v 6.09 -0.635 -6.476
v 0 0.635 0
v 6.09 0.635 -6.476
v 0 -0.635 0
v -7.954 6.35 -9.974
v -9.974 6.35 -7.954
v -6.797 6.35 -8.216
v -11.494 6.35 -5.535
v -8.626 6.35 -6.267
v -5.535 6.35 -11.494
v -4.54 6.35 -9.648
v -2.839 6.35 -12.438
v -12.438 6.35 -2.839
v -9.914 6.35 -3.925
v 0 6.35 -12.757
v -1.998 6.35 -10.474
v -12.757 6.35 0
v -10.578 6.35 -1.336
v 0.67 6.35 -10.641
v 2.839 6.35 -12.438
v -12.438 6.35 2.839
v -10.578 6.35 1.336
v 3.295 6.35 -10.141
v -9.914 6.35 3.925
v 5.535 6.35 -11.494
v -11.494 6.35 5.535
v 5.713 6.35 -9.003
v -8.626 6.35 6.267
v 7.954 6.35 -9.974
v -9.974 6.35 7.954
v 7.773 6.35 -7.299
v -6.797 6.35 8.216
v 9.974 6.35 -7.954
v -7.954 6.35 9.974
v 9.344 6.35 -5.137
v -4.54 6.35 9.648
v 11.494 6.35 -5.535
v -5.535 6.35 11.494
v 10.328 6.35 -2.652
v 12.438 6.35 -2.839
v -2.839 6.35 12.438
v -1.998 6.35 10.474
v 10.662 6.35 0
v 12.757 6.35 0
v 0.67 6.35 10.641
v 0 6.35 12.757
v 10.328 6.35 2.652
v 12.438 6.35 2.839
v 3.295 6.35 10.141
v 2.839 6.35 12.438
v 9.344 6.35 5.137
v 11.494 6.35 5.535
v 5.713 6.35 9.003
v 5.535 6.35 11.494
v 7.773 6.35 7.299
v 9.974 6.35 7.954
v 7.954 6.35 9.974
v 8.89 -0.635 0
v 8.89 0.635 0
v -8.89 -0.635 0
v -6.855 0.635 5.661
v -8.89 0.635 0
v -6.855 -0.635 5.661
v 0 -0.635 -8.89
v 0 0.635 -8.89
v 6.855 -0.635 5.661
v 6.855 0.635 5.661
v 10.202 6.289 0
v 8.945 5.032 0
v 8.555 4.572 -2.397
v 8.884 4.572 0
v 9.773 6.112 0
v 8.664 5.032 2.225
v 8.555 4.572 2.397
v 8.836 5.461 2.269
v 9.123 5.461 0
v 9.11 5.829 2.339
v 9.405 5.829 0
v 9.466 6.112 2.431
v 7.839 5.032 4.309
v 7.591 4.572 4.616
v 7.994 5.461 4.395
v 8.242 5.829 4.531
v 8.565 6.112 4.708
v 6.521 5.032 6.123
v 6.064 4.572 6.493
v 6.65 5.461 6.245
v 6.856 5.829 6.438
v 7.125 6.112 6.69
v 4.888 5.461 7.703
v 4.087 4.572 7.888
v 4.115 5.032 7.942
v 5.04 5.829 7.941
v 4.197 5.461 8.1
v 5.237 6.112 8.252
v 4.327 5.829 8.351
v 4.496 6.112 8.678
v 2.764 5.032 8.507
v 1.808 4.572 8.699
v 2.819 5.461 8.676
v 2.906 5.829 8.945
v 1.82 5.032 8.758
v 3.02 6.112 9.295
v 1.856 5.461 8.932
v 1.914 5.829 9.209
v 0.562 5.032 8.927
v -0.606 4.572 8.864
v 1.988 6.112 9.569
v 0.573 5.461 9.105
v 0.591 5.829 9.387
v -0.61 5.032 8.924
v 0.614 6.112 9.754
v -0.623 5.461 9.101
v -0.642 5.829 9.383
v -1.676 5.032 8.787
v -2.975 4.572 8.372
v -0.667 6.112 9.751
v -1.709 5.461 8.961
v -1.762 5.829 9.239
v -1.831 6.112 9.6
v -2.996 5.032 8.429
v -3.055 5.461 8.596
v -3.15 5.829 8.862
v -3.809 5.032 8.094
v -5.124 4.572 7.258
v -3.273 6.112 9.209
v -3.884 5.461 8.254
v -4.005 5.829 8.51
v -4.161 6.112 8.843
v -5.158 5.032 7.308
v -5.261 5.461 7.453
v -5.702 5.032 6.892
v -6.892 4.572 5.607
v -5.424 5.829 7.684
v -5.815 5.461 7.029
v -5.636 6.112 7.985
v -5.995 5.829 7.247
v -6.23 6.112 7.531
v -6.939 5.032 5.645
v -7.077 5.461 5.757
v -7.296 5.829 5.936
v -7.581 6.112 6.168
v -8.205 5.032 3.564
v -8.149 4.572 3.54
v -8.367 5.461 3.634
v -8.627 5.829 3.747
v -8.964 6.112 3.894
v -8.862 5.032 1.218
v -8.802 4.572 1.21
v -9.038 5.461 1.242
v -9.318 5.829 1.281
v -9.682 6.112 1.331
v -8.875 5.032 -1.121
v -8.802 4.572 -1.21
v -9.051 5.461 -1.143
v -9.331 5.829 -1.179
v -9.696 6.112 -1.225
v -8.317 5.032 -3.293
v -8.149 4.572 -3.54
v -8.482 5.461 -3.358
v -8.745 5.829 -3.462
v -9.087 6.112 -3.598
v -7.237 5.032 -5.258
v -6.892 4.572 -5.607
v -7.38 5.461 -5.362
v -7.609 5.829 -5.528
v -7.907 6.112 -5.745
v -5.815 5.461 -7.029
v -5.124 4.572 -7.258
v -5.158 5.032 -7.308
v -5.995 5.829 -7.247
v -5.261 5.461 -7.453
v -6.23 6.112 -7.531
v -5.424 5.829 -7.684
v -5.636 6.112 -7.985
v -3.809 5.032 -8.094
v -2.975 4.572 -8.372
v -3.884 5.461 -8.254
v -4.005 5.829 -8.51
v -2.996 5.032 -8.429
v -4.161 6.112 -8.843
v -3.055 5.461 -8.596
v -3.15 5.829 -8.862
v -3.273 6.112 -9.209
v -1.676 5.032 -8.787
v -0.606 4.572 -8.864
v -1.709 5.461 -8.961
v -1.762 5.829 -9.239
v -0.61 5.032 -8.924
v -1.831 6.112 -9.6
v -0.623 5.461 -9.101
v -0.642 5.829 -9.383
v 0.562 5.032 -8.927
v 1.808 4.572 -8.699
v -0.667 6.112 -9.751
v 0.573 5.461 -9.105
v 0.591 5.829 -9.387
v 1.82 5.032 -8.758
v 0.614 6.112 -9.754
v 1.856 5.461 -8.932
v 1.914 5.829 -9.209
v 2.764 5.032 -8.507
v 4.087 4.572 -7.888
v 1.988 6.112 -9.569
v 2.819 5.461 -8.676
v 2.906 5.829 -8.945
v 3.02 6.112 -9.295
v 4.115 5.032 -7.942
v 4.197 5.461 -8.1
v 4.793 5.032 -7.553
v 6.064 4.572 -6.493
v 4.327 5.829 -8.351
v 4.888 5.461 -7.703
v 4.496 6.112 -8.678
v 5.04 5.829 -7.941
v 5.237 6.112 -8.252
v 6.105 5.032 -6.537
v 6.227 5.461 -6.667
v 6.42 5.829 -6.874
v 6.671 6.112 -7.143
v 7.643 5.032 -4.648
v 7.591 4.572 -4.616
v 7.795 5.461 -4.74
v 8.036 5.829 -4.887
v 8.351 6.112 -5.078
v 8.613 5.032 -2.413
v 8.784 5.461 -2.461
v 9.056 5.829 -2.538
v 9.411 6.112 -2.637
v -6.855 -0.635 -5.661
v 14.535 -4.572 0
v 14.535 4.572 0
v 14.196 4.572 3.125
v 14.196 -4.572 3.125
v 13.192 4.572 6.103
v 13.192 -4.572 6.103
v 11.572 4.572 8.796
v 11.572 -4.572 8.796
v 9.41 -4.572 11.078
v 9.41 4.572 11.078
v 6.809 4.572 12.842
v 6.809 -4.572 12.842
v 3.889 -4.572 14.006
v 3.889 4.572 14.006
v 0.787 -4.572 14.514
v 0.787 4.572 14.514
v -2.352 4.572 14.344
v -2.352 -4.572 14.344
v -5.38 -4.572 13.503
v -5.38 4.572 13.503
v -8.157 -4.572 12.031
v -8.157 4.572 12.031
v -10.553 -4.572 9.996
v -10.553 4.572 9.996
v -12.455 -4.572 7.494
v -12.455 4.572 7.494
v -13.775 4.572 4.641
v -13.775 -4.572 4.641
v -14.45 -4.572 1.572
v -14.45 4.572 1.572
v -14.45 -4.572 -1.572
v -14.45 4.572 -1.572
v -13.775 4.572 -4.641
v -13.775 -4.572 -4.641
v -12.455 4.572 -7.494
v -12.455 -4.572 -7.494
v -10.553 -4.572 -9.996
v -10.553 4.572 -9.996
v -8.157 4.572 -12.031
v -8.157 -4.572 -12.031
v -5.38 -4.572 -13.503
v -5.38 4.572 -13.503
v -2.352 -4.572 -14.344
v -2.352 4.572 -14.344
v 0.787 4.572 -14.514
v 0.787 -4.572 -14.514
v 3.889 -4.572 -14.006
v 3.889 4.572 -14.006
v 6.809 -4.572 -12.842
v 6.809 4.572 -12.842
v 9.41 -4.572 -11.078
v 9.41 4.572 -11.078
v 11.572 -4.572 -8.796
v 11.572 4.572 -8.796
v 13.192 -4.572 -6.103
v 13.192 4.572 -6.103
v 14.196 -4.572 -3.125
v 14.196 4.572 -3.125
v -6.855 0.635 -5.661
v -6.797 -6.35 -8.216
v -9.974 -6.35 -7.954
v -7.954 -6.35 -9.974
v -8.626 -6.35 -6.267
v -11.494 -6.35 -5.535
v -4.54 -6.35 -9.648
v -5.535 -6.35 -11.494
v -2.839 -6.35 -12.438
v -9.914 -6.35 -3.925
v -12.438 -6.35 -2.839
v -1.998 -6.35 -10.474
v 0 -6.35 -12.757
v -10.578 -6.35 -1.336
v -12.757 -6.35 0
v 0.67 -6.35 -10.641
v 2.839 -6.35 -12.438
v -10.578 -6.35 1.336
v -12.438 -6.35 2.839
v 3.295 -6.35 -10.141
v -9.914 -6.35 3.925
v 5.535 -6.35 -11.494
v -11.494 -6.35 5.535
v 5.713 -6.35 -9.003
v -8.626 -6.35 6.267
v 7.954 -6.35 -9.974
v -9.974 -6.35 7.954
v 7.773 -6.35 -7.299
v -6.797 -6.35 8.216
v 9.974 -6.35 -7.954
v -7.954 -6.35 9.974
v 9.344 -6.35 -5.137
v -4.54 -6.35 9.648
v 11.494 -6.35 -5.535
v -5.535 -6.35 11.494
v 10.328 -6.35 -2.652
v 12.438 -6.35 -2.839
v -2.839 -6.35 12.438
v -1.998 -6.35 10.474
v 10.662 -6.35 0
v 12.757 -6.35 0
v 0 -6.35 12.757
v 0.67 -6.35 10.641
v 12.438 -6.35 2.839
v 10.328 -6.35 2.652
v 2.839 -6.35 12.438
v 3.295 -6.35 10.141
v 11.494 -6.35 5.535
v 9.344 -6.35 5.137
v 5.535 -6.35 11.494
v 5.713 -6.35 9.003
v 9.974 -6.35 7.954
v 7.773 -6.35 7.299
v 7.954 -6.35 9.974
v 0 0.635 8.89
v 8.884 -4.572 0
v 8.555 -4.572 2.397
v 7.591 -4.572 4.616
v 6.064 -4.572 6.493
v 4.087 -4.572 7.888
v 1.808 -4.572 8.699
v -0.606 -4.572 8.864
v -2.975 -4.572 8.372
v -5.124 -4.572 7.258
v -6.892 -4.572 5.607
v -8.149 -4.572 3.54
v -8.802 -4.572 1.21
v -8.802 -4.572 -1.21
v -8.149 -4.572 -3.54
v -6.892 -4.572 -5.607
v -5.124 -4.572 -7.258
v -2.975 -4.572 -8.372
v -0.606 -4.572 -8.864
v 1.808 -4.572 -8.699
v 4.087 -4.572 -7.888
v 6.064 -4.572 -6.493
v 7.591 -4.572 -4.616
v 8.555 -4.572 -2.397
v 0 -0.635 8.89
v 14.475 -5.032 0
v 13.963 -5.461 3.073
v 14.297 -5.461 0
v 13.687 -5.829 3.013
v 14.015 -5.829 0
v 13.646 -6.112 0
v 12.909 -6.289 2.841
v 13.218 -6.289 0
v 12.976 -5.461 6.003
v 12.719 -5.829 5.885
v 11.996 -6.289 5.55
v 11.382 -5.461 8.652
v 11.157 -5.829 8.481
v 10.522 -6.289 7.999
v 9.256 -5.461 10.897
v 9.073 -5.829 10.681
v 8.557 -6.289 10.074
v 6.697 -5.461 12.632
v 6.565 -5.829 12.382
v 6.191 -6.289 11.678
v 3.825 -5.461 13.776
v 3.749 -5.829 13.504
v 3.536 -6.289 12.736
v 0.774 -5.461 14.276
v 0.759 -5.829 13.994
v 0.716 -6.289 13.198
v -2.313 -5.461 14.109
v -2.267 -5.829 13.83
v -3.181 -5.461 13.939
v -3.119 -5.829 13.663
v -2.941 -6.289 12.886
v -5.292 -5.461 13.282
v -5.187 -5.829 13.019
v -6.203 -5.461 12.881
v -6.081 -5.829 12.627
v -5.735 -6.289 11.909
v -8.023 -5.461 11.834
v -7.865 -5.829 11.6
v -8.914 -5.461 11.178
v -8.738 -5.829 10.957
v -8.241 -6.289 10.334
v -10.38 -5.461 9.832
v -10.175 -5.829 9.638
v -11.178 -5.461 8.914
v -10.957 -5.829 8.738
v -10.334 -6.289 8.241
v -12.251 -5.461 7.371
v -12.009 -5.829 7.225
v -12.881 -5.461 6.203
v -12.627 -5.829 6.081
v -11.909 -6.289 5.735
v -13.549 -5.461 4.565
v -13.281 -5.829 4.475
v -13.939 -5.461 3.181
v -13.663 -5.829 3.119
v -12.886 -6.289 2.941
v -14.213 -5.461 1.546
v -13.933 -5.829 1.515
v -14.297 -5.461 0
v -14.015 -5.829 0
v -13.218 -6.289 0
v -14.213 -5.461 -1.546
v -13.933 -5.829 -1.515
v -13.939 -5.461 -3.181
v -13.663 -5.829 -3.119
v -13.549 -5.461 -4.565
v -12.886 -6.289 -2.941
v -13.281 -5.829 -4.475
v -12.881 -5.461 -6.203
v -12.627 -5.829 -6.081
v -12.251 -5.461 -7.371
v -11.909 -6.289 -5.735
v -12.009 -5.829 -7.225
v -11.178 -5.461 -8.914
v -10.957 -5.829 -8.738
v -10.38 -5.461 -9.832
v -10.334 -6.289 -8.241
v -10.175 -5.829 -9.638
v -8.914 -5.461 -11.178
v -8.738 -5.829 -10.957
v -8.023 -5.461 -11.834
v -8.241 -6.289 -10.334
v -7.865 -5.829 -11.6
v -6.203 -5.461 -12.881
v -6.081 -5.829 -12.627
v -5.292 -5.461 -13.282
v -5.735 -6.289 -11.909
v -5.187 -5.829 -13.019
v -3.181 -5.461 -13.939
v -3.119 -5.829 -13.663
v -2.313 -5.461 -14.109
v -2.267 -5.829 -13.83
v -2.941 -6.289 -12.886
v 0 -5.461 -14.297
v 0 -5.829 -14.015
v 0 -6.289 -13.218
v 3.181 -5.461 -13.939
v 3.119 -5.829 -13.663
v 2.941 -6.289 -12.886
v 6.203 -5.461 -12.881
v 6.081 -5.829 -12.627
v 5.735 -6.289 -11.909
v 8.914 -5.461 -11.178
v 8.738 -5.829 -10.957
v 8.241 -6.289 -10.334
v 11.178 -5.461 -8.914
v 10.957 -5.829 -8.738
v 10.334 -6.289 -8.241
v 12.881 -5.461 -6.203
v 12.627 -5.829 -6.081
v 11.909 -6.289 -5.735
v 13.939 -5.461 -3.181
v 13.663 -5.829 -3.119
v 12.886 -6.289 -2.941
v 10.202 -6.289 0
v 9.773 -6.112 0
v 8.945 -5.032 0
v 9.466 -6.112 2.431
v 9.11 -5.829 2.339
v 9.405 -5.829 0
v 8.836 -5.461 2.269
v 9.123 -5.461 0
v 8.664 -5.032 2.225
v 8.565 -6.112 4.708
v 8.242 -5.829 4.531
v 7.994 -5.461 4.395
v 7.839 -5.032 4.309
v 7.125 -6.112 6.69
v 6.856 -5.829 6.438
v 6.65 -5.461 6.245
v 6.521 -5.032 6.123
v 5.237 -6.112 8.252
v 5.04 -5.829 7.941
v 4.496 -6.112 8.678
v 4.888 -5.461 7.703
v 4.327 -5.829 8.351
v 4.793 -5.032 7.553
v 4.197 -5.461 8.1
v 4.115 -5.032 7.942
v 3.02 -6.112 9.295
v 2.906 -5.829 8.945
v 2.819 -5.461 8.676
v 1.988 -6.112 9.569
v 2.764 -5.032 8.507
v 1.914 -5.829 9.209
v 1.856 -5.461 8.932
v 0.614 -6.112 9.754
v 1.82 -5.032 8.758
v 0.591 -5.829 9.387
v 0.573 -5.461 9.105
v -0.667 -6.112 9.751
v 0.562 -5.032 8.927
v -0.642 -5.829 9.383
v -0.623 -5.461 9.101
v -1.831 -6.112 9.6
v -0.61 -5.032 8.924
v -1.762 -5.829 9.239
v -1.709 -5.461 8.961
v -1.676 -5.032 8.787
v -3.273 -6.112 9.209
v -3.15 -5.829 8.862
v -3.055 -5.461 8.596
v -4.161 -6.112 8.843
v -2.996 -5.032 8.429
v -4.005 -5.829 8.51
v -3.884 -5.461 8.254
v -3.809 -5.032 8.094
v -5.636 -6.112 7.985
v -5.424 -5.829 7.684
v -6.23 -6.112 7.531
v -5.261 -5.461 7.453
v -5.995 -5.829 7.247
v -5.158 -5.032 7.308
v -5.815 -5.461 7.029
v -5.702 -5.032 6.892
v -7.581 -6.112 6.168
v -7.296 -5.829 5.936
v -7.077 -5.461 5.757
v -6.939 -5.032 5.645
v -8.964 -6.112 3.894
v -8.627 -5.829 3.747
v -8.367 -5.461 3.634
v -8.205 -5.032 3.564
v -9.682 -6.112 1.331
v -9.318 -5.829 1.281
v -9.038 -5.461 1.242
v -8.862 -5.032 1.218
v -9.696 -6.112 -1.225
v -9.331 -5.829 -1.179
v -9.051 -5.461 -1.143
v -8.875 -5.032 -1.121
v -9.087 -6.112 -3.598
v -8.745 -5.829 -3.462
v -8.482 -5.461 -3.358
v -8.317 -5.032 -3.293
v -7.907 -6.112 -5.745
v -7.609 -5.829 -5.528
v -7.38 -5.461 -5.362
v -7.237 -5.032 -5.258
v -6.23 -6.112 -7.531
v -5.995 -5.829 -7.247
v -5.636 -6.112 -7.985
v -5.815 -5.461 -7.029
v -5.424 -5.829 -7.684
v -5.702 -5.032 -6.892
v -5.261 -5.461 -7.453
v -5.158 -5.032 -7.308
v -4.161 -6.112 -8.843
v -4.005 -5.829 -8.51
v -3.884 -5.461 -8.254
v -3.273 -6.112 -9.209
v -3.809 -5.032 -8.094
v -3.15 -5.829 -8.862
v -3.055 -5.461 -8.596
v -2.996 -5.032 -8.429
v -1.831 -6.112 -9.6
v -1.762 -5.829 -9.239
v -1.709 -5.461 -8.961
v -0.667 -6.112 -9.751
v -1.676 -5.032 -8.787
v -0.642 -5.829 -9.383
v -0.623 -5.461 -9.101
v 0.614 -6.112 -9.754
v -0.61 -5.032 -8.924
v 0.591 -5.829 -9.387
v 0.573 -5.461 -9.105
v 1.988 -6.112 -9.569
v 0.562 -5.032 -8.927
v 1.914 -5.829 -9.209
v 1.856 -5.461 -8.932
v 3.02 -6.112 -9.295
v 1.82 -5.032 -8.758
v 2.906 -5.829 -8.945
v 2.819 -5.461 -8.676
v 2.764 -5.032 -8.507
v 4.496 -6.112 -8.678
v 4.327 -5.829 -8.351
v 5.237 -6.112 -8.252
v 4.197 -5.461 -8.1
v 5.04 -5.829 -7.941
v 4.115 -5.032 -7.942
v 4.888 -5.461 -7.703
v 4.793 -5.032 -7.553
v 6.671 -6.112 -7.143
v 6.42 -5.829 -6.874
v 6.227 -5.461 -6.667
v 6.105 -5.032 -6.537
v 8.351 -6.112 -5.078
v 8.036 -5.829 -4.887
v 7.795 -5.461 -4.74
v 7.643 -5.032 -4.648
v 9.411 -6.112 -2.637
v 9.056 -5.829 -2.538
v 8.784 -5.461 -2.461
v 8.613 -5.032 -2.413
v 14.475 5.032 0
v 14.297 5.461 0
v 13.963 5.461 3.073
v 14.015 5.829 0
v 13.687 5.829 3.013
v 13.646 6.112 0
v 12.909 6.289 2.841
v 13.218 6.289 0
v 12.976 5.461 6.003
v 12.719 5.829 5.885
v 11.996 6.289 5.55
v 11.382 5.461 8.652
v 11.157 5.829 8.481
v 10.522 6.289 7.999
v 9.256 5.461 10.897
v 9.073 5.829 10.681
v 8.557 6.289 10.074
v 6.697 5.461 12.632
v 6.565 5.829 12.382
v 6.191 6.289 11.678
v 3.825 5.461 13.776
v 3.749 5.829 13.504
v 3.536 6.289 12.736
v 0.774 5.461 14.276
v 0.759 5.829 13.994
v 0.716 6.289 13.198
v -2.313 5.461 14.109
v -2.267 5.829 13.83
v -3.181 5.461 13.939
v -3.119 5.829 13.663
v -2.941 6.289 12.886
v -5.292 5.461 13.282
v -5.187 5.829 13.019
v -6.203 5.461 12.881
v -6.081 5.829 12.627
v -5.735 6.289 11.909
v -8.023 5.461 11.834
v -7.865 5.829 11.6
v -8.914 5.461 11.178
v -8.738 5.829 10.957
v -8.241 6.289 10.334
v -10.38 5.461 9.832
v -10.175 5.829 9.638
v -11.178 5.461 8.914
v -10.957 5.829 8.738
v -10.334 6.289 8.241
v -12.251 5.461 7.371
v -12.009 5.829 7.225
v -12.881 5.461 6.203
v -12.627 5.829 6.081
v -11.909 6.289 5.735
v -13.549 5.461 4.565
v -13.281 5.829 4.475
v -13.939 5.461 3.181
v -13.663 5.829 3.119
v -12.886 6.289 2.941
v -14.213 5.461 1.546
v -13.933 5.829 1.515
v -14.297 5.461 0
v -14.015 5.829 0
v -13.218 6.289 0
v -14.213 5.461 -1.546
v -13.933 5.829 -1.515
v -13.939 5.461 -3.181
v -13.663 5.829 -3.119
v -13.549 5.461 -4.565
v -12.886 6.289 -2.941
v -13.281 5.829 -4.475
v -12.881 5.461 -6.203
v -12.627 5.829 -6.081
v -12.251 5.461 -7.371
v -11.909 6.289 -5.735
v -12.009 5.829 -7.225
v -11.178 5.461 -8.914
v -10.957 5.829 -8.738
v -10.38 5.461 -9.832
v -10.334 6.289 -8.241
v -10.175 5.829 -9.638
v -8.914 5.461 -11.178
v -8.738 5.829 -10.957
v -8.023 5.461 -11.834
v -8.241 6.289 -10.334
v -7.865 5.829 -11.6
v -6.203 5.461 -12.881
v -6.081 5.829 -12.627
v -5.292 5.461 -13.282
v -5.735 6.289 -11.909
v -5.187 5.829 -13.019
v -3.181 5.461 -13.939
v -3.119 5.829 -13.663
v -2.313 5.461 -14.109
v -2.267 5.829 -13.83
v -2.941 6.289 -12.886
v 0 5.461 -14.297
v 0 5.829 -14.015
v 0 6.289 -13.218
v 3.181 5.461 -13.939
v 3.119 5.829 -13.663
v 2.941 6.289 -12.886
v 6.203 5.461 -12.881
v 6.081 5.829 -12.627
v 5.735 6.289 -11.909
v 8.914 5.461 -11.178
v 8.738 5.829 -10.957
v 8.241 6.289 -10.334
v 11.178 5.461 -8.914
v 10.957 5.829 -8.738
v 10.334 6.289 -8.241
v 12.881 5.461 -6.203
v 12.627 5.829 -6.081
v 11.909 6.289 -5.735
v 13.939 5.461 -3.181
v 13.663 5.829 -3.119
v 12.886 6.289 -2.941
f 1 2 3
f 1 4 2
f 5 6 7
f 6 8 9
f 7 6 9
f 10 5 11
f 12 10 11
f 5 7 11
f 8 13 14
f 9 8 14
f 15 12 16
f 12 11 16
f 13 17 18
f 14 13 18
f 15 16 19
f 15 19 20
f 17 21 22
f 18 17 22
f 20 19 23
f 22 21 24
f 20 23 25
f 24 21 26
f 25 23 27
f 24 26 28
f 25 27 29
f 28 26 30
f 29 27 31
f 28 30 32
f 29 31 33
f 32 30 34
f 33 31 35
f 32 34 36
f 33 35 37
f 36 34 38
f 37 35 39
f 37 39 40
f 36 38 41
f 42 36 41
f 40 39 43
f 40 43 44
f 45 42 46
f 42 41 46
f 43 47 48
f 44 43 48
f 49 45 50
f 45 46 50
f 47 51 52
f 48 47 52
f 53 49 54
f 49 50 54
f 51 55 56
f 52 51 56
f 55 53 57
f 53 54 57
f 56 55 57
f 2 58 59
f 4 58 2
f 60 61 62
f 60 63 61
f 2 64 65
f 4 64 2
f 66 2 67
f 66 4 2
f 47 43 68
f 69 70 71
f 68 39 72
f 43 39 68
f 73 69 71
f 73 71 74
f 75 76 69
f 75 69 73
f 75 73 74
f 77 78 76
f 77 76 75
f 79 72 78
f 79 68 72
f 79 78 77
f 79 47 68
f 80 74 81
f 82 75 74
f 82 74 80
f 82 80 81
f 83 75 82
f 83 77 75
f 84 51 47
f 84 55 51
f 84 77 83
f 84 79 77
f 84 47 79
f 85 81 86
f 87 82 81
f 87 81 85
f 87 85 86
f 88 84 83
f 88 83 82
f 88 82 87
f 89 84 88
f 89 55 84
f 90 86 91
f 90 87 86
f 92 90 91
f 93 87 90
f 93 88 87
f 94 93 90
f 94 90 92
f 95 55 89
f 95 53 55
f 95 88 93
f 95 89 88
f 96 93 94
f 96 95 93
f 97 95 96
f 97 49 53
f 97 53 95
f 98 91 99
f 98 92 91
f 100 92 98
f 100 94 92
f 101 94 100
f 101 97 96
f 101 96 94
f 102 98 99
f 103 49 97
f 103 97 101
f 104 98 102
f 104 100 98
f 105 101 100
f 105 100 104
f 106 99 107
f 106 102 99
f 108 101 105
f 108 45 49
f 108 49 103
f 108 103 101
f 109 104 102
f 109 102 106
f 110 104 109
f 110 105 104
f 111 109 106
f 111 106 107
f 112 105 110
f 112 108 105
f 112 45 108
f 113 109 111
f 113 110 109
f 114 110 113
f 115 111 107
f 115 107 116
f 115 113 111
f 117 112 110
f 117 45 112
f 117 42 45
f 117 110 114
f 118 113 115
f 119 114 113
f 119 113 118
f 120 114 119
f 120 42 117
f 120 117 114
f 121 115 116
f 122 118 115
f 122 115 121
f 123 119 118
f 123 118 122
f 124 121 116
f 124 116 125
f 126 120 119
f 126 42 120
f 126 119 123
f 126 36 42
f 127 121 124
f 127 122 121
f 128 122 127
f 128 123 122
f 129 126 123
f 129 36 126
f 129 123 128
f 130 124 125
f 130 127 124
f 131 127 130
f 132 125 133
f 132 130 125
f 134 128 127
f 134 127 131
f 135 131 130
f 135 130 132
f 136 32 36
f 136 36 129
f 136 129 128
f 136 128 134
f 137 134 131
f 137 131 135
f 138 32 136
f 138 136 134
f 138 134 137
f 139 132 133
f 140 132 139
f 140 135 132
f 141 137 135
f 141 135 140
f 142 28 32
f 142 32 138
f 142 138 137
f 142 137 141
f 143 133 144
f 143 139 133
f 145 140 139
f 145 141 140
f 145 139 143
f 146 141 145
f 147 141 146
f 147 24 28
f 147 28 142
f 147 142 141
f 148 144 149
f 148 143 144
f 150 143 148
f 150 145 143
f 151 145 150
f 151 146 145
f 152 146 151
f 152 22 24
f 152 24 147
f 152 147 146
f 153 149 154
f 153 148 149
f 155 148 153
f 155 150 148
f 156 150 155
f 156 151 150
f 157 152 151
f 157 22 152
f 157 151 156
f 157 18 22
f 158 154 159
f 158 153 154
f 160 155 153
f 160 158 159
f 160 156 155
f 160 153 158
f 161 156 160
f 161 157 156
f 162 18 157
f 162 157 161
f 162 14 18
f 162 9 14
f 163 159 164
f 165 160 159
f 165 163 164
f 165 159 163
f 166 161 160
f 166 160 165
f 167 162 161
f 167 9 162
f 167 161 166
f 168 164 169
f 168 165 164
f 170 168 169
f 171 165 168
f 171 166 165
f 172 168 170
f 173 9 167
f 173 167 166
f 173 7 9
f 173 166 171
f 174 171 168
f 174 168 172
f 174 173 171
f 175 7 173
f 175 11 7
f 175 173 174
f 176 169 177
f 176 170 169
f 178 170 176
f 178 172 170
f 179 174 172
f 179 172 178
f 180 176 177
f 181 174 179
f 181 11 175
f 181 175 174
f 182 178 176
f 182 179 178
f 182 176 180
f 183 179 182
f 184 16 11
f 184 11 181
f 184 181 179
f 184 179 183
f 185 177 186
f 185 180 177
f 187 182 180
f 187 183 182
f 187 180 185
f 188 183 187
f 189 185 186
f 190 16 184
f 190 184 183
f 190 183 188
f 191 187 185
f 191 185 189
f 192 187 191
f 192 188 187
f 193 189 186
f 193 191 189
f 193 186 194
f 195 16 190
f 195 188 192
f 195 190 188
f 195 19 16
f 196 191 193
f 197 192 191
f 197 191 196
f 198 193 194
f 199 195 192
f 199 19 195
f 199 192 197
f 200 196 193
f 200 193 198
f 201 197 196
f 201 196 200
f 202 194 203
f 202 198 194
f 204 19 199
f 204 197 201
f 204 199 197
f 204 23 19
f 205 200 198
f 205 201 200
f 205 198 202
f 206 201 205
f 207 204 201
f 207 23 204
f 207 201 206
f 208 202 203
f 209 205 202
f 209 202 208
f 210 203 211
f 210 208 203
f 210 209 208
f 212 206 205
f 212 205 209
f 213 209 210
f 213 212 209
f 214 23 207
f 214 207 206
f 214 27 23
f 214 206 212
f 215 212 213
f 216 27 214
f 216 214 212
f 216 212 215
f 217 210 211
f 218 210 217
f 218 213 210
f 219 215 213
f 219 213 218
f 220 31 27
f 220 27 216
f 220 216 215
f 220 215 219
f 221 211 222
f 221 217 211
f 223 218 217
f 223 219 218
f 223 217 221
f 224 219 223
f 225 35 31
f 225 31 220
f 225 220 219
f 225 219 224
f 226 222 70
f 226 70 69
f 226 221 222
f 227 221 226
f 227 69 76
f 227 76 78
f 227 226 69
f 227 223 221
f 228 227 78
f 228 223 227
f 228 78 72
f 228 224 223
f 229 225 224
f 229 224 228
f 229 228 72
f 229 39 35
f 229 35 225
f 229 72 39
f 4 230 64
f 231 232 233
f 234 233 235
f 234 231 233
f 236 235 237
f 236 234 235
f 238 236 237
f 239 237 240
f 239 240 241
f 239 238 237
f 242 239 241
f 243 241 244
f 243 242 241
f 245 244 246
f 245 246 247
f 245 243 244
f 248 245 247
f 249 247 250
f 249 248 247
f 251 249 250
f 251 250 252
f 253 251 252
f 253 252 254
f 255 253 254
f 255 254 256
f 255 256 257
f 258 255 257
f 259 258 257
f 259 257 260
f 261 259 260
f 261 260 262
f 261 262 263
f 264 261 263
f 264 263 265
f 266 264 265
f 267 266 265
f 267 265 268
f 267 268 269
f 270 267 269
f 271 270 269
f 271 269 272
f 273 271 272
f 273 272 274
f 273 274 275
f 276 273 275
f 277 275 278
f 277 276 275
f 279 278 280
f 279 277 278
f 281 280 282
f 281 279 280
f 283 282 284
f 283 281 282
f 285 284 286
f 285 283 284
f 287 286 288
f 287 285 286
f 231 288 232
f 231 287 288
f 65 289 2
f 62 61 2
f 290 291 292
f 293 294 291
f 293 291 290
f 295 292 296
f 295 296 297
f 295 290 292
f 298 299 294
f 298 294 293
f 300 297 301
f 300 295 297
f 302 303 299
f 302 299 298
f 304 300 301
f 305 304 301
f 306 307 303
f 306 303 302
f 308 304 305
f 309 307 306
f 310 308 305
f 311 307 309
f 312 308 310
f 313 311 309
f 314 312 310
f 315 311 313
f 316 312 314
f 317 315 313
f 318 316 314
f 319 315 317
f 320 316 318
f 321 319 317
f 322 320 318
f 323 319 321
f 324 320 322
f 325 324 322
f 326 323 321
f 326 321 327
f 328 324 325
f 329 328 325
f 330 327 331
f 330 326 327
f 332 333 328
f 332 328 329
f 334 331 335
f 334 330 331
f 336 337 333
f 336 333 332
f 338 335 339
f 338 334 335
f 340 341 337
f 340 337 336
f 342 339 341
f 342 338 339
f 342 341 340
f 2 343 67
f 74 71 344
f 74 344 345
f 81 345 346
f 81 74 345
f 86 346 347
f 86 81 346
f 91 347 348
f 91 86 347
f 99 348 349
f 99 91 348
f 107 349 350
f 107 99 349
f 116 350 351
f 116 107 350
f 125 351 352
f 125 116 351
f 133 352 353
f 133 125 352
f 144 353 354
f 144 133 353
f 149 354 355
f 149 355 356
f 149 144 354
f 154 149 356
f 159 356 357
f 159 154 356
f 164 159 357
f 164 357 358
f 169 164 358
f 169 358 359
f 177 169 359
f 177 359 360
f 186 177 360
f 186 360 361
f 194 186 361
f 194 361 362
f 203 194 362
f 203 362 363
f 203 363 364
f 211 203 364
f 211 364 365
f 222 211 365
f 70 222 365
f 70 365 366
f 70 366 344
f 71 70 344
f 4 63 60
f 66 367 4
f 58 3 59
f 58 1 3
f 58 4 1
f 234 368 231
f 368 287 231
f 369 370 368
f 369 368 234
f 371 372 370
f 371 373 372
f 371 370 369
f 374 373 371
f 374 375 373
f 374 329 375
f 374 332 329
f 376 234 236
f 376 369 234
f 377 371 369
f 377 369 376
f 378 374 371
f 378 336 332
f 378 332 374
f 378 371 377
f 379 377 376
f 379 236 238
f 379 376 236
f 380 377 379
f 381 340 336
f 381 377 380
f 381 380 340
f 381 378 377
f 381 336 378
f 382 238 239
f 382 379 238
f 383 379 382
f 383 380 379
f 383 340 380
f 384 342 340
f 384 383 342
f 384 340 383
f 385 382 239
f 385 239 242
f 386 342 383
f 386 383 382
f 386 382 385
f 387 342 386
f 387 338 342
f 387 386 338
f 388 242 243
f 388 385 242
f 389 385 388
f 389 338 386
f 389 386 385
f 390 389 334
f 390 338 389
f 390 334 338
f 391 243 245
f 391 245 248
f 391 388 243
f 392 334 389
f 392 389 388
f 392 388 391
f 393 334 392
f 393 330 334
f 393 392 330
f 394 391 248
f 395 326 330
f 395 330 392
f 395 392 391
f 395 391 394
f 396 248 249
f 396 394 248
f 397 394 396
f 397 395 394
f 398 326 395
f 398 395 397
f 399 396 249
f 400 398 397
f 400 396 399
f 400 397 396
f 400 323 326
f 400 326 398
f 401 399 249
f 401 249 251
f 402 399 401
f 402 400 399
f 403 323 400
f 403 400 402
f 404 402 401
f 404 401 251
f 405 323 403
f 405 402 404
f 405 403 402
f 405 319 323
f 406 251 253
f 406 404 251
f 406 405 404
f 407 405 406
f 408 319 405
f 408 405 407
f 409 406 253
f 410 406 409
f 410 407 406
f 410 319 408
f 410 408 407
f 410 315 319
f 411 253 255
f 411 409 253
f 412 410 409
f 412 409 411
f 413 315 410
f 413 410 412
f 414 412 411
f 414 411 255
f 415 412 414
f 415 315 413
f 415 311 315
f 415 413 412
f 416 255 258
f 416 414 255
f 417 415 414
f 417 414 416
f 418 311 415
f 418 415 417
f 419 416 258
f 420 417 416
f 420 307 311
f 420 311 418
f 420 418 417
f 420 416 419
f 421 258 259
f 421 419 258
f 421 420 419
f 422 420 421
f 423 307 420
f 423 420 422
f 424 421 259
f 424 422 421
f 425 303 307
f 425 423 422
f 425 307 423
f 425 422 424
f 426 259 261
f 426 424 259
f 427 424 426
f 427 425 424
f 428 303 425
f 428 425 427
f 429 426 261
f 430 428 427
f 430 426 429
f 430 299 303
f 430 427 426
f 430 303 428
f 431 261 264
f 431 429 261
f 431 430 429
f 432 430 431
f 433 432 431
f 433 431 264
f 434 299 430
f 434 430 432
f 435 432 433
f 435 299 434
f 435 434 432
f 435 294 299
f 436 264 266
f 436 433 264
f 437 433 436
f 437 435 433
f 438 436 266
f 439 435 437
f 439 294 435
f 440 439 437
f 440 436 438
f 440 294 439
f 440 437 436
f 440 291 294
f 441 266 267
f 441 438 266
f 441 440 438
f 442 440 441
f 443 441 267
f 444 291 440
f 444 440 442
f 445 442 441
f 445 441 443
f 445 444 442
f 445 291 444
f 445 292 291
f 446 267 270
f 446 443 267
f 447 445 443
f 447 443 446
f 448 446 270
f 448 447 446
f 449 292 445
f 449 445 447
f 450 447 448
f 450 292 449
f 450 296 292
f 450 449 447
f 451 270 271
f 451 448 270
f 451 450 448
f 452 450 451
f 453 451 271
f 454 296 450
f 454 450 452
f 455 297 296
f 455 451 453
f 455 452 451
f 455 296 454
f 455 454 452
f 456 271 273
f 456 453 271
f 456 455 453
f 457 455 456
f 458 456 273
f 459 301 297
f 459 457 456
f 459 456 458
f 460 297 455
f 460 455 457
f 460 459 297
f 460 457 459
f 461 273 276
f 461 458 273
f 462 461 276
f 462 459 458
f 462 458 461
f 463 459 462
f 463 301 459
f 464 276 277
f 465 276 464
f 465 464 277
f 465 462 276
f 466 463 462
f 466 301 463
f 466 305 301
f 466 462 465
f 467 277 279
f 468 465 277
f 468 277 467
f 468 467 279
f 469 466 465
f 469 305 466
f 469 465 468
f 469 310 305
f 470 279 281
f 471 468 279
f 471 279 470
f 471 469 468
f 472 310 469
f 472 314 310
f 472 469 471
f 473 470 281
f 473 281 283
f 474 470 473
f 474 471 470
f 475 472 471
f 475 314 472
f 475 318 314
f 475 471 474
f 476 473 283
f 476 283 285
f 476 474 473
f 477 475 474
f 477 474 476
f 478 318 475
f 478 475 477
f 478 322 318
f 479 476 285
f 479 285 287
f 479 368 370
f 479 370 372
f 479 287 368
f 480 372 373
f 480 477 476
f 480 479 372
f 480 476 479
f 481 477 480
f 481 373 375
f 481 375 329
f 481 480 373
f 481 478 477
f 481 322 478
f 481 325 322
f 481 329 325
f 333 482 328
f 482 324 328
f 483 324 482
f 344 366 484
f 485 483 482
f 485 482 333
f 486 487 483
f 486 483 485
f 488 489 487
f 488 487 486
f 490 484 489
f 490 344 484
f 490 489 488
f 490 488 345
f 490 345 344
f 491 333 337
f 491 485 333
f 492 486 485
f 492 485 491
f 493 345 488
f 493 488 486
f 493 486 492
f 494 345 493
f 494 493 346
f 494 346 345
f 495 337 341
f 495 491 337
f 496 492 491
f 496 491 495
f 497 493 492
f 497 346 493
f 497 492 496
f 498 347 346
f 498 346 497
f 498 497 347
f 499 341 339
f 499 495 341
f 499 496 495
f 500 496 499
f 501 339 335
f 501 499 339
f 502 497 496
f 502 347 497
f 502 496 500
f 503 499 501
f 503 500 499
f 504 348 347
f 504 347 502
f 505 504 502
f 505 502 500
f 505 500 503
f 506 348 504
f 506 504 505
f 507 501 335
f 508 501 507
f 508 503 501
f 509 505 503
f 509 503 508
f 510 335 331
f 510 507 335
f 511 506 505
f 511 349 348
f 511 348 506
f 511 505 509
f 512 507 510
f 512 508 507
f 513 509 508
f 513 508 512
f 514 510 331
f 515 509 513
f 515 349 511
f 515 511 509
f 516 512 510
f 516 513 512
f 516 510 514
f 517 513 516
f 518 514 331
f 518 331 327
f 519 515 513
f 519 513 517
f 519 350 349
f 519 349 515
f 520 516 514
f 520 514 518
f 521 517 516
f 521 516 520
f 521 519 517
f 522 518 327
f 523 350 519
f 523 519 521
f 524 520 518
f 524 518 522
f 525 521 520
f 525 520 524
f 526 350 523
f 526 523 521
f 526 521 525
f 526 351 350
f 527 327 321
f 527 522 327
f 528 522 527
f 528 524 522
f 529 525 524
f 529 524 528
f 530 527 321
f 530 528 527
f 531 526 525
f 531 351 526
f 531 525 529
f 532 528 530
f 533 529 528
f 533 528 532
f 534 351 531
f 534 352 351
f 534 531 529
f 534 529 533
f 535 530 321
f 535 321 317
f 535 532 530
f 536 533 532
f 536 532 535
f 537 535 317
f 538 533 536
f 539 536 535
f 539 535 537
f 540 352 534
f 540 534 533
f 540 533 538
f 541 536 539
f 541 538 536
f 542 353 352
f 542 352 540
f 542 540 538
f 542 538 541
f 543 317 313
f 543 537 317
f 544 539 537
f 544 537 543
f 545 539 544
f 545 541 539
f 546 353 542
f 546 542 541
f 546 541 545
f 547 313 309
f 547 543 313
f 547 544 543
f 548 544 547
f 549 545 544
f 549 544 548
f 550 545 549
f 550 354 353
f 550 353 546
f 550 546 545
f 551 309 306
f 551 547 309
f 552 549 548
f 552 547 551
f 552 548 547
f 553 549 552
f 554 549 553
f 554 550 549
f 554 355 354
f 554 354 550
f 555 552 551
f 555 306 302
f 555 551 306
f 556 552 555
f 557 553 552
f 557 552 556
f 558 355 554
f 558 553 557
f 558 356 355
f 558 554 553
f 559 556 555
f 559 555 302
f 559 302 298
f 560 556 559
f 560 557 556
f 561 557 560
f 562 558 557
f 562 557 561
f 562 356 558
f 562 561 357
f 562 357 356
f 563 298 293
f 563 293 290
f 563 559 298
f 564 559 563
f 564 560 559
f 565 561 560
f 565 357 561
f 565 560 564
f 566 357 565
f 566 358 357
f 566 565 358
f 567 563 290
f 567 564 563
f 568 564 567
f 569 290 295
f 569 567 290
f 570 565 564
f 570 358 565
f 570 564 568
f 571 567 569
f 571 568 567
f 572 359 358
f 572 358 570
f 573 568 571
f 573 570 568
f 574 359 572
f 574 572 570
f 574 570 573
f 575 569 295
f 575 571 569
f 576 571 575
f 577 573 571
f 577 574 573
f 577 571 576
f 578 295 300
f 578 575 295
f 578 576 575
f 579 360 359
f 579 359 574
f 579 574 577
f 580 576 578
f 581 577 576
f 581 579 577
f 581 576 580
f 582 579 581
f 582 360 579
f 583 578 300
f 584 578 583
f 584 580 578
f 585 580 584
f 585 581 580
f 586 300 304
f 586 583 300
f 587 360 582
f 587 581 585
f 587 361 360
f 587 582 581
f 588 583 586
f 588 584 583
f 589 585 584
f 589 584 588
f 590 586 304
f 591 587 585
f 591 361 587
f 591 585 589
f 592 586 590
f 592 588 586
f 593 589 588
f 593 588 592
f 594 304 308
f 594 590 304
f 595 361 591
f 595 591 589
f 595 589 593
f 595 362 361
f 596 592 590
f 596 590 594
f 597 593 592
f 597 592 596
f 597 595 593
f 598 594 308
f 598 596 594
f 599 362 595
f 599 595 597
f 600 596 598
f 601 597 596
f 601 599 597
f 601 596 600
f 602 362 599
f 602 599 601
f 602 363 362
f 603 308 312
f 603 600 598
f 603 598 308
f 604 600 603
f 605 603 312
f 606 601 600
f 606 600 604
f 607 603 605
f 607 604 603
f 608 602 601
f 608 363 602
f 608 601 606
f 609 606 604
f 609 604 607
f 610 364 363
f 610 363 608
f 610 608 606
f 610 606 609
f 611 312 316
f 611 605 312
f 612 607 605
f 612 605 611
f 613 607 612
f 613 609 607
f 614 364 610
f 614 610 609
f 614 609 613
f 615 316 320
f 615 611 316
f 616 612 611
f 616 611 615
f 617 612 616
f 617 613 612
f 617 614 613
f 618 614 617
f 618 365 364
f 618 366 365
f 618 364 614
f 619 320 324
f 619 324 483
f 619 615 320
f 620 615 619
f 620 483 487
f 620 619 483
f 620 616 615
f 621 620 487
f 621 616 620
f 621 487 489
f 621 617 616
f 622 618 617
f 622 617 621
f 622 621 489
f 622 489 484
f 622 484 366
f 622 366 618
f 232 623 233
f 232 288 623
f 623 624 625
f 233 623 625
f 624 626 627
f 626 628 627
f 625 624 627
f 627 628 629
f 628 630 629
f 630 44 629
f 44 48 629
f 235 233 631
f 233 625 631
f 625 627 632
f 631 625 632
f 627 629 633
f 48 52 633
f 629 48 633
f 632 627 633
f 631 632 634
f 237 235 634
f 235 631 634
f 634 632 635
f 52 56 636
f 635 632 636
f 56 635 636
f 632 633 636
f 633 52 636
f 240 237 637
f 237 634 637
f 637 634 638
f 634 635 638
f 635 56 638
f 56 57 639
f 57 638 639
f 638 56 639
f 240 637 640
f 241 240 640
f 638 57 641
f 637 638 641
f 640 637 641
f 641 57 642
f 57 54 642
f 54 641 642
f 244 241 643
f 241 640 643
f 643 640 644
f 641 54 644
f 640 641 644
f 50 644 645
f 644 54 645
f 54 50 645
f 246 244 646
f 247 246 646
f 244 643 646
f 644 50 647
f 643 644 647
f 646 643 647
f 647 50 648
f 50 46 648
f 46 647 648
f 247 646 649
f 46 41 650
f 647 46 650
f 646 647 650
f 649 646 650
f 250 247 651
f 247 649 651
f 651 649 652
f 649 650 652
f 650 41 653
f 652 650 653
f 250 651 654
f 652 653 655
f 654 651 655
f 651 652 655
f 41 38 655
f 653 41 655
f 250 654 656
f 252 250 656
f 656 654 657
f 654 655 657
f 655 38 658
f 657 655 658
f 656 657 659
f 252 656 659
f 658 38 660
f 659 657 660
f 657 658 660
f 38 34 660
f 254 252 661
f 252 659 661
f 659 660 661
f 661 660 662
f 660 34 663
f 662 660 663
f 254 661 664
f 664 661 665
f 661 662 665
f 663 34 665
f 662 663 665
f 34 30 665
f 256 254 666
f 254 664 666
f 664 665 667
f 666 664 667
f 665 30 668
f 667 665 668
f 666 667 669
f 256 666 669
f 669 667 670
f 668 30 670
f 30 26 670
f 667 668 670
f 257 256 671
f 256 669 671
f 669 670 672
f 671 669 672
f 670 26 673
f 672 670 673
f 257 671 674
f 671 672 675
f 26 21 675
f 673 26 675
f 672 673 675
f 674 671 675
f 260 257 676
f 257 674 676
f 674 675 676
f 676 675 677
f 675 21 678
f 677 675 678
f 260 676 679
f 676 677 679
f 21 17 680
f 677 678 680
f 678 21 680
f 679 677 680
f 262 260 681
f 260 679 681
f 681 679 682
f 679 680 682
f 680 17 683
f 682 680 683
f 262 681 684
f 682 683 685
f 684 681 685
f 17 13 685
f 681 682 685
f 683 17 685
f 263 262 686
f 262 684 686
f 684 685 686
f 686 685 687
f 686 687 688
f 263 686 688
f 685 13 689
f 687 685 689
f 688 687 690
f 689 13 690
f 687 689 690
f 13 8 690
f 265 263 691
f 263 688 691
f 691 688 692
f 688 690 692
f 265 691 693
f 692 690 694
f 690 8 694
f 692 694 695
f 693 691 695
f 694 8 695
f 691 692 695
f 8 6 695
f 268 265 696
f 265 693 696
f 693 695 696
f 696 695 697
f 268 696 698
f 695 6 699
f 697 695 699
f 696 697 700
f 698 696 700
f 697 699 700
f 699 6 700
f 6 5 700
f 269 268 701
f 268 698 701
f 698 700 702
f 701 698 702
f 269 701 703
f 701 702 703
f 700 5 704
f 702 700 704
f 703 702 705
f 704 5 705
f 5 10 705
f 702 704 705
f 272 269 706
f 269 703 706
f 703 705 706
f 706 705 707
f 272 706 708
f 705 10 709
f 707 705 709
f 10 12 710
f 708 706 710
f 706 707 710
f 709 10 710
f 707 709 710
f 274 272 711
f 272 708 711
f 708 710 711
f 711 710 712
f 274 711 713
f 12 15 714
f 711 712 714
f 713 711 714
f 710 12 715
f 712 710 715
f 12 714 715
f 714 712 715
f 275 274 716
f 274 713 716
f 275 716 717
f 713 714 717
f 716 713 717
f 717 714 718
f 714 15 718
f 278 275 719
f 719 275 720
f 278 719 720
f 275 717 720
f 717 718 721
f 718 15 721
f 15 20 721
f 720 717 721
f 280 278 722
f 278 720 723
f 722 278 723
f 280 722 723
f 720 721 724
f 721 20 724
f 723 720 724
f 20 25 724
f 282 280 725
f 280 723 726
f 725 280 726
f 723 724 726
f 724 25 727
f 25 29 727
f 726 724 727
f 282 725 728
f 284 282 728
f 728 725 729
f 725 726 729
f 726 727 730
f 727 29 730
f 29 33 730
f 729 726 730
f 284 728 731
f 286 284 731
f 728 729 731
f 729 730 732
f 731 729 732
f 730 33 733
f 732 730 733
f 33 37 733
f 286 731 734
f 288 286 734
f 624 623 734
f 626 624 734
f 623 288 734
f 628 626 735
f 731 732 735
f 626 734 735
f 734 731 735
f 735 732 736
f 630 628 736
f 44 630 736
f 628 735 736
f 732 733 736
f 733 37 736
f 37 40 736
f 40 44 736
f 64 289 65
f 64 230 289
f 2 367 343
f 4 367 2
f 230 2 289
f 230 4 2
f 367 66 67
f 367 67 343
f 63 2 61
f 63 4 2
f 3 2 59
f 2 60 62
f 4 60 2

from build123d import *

# Parameters (mm, degrees)
F1_DEPTH = 0.635
F2_R     = 14.535464
F2_R_2   = 8.884495
F3_DEPTH = 6.35
F4_R     = 1.778


with BuildPart() as f1:
    # F0 (on Front) → F1 (new body, symmetric)
    with BuildSketch(Plane.XZ):
        Polygon((-8.89, 0), (0, 0), (-6.85468, 5.660871), align=None)
        Polygon((0, -8.89), (0, 0), (-6.85468, -5.660871), align=None)
        Polygon((6.090228, -6.476204), (8.89, 0), (0, 0), align=None)
        Polygon((0, 0), (6.85468, 5.660871), (0, 8.89), align=None)
    extrude(amount=F1_DEPTH, both=True)


with BuildPart() as f3:
    # F2 (on Front) → F3 (new body, symmetric)
    with BuildSketch(Plane.XZ):
        Circle(F2_R)
        Circle(F2_R_2, mode=Mode.SUBTRACT)
    extrude(amount=F3_DEPTH, both=True)

    # F4
    f4_edges = [f3.edges().sort_by_distance(p)[0] for p in [
        (-14.535464, 6.35, 0),
        (-14.535464, -6.35, 0),
        (-8.884495, 6.35, 0),
        (-8.884495, -6.35, 0),
    ]]
    fillet(f4_edges, radius=F4_R)


solid = Compound([f1.part, f3.part])
